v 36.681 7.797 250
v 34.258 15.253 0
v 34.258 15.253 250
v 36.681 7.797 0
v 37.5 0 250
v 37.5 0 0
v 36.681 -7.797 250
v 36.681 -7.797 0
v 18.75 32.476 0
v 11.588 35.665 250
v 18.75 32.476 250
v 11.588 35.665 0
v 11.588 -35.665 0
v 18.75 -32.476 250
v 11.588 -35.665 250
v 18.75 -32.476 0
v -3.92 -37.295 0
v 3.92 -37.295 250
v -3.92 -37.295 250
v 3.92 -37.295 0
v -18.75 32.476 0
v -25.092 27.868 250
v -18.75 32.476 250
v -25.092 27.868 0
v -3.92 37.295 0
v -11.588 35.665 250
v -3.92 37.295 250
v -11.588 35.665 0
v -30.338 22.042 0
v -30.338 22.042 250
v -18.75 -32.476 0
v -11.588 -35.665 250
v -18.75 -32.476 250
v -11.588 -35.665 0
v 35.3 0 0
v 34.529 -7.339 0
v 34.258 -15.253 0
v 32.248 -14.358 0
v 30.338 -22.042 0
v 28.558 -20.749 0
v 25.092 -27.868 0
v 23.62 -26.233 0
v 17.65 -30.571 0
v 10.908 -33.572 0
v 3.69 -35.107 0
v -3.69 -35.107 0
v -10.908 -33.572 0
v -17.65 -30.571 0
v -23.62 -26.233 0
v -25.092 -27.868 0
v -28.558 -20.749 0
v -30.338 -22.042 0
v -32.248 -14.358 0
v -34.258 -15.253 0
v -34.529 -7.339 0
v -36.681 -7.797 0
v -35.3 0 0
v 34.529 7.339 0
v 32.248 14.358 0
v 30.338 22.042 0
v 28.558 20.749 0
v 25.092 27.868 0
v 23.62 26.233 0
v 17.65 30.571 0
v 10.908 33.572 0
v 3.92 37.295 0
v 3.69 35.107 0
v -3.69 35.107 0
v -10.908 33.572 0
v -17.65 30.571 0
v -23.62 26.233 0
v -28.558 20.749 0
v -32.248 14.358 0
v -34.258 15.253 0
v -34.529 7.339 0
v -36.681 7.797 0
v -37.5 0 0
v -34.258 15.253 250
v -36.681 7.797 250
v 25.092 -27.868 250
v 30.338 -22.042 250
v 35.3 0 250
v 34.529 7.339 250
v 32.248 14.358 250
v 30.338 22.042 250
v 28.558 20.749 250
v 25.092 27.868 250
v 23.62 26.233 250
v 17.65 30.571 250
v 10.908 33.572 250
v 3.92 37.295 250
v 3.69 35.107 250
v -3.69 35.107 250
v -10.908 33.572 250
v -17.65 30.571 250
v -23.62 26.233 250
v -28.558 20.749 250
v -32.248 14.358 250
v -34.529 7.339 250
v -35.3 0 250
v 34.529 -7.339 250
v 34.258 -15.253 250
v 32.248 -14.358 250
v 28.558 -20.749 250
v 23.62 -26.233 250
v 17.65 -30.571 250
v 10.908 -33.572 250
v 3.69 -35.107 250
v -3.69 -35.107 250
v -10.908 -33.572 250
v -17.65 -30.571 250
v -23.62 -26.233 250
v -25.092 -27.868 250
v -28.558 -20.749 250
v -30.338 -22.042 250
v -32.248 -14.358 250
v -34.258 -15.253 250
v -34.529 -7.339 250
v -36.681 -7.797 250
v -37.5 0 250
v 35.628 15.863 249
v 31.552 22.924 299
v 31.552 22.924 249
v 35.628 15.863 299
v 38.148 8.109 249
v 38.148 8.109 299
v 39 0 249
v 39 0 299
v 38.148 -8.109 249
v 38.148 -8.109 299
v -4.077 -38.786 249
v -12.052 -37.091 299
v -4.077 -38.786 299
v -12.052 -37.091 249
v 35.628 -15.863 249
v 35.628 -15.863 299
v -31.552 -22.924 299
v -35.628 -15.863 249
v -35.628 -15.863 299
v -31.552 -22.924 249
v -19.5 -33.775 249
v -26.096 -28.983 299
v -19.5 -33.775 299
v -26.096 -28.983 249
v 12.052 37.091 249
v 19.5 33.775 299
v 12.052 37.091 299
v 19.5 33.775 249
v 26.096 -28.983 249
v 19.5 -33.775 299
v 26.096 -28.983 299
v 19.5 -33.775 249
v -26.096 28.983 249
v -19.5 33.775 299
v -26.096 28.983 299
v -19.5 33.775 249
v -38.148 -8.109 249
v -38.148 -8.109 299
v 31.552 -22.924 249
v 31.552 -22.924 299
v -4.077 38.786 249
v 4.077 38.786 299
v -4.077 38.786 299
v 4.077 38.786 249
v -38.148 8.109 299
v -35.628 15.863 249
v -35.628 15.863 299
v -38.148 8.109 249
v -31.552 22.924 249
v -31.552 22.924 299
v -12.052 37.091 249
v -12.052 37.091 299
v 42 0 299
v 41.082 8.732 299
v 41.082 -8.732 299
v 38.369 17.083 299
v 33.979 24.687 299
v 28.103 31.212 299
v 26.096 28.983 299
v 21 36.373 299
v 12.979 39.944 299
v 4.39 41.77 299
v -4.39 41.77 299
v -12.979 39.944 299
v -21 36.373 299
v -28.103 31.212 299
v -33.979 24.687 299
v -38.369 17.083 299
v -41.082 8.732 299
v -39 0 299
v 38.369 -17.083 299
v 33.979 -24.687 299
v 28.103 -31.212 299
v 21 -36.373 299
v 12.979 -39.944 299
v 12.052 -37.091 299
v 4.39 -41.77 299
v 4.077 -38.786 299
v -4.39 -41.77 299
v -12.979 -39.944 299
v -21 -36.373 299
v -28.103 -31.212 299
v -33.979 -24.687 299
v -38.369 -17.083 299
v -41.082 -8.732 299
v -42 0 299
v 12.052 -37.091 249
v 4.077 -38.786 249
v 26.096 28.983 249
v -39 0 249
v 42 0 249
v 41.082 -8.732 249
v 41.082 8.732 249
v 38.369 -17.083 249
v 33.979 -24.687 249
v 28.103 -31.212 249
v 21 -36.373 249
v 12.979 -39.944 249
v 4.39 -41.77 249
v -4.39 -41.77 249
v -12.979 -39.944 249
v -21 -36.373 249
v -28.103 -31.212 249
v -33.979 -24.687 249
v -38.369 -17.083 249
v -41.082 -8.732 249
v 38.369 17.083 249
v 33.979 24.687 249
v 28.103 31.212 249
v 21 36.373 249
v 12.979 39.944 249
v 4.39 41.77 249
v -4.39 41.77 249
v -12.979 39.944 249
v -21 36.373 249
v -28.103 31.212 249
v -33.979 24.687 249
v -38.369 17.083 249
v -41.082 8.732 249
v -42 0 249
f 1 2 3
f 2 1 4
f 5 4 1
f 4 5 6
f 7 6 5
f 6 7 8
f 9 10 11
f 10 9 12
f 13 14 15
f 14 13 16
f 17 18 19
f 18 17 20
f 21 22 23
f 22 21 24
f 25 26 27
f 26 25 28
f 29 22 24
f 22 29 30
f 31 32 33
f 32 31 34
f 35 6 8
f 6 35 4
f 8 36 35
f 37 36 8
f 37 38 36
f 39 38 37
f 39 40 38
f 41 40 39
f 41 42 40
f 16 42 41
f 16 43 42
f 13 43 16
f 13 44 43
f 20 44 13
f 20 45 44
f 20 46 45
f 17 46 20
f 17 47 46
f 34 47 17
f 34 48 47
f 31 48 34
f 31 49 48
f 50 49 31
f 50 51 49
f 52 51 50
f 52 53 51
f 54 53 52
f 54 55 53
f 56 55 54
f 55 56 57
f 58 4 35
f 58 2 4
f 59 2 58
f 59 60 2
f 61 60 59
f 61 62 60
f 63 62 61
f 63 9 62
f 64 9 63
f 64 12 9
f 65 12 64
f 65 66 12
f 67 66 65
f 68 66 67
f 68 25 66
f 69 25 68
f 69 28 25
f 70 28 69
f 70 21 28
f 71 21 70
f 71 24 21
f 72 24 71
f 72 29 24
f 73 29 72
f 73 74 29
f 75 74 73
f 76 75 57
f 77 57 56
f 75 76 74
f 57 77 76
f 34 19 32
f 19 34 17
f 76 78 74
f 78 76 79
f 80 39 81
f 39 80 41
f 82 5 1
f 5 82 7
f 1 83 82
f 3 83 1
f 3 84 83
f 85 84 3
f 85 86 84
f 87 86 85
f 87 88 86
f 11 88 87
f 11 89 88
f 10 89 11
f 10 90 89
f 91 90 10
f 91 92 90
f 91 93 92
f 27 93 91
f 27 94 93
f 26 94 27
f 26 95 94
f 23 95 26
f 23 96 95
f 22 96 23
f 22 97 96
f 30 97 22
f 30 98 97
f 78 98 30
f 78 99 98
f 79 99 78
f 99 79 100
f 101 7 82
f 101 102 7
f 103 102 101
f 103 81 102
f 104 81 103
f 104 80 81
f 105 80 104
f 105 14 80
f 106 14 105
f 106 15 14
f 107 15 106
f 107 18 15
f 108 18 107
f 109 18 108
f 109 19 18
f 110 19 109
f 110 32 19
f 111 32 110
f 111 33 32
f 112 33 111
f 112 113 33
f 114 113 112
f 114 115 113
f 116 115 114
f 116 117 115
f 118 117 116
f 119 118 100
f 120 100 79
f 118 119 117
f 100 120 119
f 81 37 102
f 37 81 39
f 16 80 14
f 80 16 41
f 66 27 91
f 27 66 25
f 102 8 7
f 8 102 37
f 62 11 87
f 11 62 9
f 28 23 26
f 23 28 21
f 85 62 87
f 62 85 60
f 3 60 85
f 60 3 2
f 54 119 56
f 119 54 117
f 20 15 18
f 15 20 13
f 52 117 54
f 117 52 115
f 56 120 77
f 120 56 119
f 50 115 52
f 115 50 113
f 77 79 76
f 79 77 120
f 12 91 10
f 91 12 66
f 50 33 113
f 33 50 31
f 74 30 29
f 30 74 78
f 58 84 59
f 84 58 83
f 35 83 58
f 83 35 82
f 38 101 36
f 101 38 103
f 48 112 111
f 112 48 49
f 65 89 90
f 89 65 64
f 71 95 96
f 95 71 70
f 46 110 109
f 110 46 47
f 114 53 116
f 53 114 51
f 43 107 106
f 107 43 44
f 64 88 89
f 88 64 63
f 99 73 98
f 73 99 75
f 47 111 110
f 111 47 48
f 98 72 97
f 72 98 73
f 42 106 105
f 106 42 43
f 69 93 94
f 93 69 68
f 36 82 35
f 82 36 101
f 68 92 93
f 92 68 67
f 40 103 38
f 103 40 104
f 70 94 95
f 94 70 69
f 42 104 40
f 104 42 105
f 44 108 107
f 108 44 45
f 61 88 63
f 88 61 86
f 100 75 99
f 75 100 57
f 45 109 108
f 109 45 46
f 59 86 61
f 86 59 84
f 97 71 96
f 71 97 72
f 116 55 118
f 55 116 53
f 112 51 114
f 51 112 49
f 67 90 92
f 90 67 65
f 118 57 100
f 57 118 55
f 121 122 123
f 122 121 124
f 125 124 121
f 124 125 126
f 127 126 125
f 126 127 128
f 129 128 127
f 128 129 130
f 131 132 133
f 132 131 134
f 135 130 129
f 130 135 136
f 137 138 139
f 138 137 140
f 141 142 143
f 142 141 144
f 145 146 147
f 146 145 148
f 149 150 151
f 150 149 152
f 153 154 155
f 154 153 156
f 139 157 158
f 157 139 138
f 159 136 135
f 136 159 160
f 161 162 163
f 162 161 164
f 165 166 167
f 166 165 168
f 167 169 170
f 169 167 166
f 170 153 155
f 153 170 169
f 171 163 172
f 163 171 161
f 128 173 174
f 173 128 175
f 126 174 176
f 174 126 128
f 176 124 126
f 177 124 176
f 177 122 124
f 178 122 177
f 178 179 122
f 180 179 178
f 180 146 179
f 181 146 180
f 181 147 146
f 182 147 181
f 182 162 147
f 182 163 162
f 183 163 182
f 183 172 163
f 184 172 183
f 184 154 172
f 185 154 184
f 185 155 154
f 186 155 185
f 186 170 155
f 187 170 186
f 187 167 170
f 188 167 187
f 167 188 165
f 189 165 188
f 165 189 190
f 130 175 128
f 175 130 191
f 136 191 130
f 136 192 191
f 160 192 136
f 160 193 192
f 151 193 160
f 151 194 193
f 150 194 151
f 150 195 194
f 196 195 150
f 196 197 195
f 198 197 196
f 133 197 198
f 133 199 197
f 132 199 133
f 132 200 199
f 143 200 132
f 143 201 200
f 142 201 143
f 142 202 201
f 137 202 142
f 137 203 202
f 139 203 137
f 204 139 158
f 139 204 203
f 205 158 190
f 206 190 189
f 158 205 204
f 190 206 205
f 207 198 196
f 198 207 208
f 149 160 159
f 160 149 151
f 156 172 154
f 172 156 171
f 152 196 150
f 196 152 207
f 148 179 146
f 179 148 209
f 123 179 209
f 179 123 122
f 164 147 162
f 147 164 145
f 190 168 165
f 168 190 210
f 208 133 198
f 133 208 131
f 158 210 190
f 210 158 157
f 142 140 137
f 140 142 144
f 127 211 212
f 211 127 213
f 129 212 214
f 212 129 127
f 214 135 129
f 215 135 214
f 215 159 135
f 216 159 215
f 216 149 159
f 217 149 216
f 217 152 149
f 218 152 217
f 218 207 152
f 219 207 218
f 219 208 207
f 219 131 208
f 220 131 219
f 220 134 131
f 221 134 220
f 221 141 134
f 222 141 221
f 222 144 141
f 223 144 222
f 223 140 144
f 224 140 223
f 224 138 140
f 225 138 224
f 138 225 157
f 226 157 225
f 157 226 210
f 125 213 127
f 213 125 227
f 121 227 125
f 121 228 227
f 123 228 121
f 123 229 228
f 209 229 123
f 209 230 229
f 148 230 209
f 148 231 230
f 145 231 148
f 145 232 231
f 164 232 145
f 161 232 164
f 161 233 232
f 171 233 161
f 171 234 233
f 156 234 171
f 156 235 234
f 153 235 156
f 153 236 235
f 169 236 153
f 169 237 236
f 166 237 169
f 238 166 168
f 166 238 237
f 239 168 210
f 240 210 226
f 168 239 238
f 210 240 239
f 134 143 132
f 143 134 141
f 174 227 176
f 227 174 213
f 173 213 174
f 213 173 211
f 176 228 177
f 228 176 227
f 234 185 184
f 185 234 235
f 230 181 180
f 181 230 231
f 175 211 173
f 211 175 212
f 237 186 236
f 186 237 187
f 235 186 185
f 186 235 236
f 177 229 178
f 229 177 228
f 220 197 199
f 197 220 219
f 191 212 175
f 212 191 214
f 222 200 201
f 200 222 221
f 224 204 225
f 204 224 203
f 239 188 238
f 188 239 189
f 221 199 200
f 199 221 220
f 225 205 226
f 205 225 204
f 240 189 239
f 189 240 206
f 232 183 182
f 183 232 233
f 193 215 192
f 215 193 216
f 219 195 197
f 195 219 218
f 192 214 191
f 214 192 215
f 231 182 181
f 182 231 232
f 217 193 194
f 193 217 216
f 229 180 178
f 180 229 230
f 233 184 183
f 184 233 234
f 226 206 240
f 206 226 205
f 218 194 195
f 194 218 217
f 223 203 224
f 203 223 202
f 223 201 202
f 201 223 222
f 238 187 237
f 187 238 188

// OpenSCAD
// Parameters
length_mm = 250; //[125:500:1]
include_end_fitting = 1; //[0:1:1]
pipe_od = 75; //[60:150:0.1]
pipe_wall = 2.2; //[1.1:4.4:0.1]
socket_od = 84; //[70:170:0.1]
socket_length = 50; //[25:100:1]
socket_wall = 3.0; //[1.5:6.0:0.1]
socket_insertion_depth = 40; //[20:80:1]
overlap_mm = 1; //[0.5:2:0.1]

// HT Pipe Body
module ht_pipe_body() {
  color([0.85, 0.85, 0.8]) {
    difference() {
      cylinder(h=length_mm, r=pipe_od/2, center=false);
      translate([0, 0, 0])
        cylinder(h=length_mm, r=pipe_od/2 - pipe_wall, center=false);
    }
  }
}

// End Fitting Socket
module end_fitting_socket() {
  color([0.85, 0.85, 0.8]) {
    difference() {
      cylinder(h=socket_length, r=socket_od/2, center=false);
      union() {
        cylinder(h=socket_length, r=socket_od/2 - socket_wall, center=false);
        translate([0, 0, 0])
          cylinder(h=socket_insertion_depth, r=pipe_od/2 + overlap_mm, center=false);
      }
    }
  }
}

// HT Pipe with optional end fitting
module ht_pipe() {
  if (include_end_fitting) {
    union() {
      ht_pipe_body();
      translate([0, 0, length_mm - overlap_mm]) end_fitting_socket();
    }
  } else {
    ht_pipe_body();
  }
}

// Assembly
module assembly() {
  ht_pipe();
}

assembly();
